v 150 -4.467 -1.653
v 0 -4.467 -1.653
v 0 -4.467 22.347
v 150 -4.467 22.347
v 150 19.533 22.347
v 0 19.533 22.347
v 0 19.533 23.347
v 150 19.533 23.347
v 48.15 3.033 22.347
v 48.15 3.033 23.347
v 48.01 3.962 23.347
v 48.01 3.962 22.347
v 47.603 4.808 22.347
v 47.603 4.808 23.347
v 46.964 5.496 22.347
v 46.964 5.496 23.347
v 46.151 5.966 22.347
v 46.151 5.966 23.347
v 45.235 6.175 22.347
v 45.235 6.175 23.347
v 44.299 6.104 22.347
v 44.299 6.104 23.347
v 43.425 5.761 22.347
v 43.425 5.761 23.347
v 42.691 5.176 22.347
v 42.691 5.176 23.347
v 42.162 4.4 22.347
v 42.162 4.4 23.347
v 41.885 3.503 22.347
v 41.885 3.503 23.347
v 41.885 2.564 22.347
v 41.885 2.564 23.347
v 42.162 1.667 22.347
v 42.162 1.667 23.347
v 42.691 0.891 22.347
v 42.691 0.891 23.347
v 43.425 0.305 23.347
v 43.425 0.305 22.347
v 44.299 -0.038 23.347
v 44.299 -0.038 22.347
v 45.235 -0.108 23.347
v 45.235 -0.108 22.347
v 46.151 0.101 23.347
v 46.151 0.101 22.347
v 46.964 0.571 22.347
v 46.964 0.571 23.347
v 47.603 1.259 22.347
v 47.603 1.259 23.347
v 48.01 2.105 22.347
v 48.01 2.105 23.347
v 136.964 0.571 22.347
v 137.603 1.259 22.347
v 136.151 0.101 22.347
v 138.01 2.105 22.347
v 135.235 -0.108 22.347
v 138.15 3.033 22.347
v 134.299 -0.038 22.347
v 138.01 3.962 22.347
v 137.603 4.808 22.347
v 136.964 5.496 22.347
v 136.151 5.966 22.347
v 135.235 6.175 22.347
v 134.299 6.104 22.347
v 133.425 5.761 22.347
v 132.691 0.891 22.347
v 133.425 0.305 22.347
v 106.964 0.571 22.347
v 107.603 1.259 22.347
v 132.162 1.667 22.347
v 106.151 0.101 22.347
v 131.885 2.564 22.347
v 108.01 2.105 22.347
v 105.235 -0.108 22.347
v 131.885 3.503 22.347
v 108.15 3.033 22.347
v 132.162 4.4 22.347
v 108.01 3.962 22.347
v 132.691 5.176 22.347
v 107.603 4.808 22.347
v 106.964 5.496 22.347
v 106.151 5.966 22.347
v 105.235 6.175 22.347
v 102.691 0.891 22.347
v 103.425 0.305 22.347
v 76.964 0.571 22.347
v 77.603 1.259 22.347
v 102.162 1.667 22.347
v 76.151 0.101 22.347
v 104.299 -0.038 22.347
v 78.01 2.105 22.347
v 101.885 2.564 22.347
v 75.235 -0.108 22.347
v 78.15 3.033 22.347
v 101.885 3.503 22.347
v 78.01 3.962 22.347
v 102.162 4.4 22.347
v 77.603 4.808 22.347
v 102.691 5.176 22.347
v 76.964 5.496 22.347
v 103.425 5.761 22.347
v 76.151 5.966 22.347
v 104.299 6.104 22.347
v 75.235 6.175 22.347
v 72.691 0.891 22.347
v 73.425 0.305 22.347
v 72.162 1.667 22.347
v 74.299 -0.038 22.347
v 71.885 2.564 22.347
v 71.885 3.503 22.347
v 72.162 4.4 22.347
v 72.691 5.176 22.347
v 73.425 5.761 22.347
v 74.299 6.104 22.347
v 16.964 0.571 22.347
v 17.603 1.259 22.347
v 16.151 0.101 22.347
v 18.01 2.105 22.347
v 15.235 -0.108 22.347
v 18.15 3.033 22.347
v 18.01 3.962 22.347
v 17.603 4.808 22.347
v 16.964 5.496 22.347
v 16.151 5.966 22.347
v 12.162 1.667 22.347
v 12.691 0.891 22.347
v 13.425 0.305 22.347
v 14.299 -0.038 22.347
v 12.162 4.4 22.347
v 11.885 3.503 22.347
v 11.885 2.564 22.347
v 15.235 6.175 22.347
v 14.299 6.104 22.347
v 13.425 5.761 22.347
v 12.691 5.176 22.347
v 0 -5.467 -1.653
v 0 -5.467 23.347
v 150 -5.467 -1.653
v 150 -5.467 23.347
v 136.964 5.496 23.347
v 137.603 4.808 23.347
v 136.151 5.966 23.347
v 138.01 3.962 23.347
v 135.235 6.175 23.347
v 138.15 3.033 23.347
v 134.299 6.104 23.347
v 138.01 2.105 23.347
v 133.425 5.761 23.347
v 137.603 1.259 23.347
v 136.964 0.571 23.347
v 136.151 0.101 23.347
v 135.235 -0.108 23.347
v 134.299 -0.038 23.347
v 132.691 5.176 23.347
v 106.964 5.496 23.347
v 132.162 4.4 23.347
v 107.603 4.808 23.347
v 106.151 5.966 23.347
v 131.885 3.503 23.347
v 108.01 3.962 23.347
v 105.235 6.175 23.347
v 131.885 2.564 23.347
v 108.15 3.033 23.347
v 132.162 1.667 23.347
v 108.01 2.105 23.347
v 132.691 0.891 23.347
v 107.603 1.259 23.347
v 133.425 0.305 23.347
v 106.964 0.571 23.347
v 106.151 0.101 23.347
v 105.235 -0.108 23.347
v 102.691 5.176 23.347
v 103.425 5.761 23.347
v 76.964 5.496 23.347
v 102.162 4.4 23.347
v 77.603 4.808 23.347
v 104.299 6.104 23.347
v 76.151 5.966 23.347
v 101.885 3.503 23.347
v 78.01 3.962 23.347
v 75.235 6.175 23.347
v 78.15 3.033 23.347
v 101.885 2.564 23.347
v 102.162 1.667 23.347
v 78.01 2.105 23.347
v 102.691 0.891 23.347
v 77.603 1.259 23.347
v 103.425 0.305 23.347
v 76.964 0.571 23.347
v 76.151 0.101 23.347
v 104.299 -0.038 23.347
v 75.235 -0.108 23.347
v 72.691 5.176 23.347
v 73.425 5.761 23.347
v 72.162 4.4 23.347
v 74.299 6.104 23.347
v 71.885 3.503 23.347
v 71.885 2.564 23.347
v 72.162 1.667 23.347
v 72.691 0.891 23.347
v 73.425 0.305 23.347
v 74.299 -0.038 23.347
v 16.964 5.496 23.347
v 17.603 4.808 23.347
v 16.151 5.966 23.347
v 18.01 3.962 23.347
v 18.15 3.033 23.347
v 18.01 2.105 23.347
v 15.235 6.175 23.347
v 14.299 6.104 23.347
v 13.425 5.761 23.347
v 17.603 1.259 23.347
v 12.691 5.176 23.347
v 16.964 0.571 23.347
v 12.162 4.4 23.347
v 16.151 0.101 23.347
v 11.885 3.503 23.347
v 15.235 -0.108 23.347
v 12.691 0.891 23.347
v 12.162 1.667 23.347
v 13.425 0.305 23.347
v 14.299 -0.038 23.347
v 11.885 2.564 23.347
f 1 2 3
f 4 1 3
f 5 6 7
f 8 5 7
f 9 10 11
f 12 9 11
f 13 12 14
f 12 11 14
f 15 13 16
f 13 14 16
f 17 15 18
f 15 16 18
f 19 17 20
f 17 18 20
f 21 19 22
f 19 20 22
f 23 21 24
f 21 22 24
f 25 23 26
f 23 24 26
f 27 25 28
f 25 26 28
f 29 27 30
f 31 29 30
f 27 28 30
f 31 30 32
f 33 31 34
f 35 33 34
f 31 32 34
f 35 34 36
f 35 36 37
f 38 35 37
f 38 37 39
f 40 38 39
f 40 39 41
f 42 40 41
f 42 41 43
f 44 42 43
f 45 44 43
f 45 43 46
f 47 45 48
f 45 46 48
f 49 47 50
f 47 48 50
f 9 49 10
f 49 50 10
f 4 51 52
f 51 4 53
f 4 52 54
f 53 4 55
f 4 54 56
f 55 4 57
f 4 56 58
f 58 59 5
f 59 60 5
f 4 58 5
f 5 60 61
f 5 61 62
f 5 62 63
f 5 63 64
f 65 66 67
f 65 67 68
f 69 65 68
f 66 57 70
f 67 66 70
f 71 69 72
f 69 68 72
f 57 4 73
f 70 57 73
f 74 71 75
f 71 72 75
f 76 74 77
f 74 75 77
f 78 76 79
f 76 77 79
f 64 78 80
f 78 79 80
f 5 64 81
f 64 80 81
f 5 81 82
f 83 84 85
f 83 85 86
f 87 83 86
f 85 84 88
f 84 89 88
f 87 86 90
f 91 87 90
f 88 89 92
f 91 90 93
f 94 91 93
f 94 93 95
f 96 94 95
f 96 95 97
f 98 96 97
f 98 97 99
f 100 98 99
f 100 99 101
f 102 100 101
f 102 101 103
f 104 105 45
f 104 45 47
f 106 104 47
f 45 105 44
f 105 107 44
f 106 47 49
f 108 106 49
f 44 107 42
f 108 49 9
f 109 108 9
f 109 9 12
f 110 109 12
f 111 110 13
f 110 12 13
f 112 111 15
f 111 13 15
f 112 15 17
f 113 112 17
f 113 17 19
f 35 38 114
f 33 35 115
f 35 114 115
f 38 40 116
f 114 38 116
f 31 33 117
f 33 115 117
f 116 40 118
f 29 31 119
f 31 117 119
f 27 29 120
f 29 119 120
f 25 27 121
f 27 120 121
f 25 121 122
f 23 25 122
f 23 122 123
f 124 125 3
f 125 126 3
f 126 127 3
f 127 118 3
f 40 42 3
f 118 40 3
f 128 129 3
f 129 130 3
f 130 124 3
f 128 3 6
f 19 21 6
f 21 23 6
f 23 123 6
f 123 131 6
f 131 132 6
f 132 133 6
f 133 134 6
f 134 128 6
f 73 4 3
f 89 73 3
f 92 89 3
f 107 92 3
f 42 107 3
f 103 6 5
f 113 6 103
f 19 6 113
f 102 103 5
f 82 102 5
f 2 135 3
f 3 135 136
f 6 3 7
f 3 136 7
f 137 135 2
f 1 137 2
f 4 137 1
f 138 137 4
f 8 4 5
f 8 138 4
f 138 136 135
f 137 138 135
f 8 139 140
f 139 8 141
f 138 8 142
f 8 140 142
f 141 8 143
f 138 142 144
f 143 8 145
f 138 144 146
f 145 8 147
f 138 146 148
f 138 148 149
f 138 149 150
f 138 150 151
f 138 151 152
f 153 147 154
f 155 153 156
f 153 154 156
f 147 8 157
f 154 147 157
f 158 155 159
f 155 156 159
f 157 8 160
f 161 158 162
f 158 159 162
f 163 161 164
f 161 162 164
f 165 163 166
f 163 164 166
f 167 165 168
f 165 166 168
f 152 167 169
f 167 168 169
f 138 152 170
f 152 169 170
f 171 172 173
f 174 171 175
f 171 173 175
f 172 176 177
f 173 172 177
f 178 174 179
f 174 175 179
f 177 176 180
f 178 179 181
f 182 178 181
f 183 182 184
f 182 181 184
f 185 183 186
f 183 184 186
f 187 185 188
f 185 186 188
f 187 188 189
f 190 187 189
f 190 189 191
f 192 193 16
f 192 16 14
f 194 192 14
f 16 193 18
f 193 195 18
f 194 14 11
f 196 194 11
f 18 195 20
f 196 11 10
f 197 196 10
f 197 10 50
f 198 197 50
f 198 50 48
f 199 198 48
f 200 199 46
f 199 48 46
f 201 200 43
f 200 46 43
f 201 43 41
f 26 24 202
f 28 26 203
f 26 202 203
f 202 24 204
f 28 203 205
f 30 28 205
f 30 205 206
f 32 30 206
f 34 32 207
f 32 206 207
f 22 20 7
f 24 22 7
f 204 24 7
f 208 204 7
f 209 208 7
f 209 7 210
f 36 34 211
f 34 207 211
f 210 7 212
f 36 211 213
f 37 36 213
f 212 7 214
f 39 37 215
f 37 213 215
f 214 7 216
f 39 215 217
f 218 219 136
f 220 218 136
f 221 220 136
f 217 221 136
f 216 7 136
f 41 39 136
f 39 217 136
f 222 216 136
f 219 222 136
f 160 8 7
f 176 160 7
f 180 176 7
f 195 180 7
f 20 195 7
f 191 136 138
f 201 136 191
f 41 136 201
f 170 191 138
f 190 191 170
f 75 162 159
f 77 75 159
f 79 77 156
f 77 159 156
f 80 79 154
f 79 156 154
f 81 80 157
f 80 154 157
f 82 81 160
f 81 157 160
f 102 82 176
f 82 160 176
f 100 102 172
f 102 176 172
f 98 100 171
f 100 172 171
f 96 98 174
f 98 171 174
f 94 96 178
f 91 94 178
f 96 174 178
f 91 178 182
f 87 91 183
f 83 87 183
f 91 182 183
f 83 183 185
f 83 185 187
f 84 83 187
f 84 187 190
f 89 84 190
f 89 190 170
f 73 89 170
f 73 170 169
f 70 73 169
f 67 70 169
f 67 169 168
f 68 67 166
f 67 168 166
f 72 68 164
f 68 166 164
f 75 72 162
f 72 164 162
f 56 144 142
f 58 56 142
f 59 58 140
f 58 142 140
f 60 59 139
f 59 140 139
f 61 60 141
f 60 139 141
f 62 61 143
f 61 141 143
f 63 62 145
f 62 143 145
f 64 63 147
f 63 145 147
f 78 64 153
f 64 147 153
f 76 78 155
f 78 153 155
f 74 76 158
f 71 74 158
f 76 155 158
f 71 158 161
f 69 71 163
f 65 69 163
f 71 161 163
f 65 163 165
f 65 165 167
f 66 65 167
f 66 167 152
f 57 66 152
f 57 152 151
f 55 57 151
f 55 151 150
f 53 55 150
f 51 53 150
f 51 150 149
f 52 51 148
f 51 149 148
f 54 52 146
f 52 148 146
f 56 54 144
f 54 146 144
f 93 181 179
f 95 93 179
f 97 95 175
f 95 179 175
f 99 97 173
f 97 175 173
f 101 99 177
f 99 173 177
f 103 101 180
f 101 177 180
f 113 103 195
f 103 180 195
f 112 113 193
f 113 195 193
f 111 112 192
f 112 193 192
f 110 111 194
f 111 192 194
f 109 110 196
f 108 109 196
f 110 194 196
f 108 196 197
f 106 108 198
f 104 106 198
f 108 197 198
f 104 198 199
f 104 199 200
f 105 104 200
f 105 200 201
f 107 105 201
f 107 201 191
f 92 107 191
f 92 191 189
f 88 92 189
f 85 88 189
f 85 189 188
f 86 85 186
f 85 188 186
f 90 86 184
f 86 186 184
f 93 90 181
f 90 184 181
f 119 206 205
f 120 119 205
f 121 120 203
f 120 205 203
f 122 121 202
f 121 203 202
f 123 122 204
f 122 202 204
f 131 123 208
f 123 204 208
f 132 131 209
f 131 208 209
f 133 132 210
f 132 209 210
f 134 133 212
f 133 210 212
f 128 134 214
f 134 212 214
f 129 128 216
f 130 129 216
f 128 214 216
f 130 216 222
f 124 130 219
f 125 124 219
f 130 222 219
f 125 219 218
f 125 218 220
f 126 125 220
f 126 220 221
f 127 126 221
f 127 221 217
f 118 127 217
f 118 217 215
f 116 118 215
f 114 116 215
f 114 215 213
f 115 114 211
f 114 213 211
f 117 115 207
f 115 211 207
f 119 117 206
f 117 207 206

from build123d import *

# Parameters (mm, degrees)
F0_W     = 1
F0_H     = 24
F0_H_2   = 1
F0_W_2   = 24
F1_DEPTH = 150
F2_R     = 3.15
F3_DEPTH = 1


with BuildPart() as f1:
    # F0 (on Right) → F1 (new body)
    with BuildSketch(Plane.YZ):
        with Locations((-4.966528, 10.346573)):
            Rectangle(F0_W, F0_H)
        with Locations((-4.966528, 22.846573)):
            Rectangle(F0_W, F0_H_2)
        with Locations((7.533472, 22.846573)):
            Rectangle(F0_W_2, F0_H_2)
    extrude(amount=F1_DEPTH)

    # F2 (on face) → F3 (cut)
    with BuildSketch(Plane.XY.offset(23.346573)):
        with Locations((15, 3.033472)):
            Circle(F2_R)
        with Locations((45, 3.033472)):
            Circle(F2_R)
        with Locations((75, 3.033472)):
            Circle(F2_R)
        with Locations((105, 3.033472)):
            Circle(F2_R)
        with Locations((135, 3.033472)):
            Circle(F2_R)
    extrude(amount=-F3_DEPTH, mode=Mode.SUBTRACT)


solid = f1.part
